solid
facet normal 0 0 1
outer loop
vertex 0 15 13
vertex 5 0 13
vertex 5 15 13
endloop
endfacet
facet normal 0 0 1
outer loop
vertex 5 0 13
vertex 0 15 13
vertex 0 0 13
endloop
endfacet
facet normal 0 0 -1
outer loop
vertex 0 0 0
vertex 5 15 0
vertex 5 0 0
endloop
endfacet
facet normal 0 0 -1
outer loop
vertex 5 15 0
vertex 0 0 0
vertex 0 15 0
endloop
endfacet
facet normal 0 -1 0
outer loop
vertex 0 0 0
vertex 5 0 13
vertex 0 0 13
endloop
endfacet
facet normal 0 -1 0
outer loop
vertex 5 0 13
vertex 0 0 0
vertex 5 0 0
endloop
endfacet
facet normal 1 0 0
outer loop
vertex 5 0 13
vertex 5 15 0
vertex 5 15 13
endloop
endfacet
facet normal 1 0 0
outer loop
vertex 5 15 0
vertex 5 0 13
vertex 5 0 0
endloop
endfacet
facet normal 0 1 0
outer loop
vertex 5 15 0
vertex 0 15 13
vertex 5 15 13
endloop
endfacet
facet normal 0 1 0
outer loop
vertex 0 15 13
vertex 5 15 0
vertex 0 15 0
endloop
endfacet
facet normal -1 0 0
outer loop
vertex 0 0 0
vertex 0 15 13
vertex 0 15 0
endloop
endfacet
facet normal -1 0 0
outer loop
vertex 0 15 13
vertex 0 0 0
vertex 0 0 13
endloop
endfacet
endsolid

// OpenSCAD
// Generated by SolidPython 1.0.1 on 2020-07-29 00:46:54


cube(size = [5, 15, 13]);
/***********************************************
*********      SolidPython code:      **********
************************************************
 
# import packages: SolidPython
from solid import *
from solid.utils import *
from itertools import chain, combinations, permutations


class Resize:

    def __init__(self, scad_file):
        self.scad_file = scad_file
        #self.scad_file = import_scad(scad_file)
        # cone/cylinder param:
        self.r1 = 0
        self.r2 = 0
        self.h = 0
        # rectangular prism param:
        self.w = 0
        self.l = 0
        # ellipse param:
        self.r = 0

    # import OpenScad code (file name corresponds to shape)


    # classify shape + parameters
    def assign(self, param1, param2, param3):
        if self.scad_file == 'cone.scad':
            self.r1 = param1
            self.r2 = param2
            self.h = param3
        elif self.scad_file == 'cylinder.scad':
            self.r1 = param1
            self.r2 = param2
            self.h = param3
        elif self.scad_file == 'rectangularPrism.scad':
            self.h = param1
            self.l = param2
            self.w = param3
        else:
            self.r = param1
            self.h = param2

    # resize parameters
    def iterate(self):
        x = range(3, 20, 2)
        i = 1
        if self.scad_file == 'cone.scad':
            tempList = list(permutations(x, 2))
            for temp in tempList:
                param1 = temp[0]
                param2 = temp[1]
                filepath = 'produced_scad_files/' + 'cone' + str(param1) + '_' + str(param2) + '_' + '.scad'
                scad_render_to_file(cylinder(h=param1, r1=param2, r2=0), filepath)

        elif self.scad_file == 'cylinder.scad':
            tempList = list(permutations(x, 3))
            for temp in tempList:
                param1 = temp[0]
                param2 = temp[1]
                filepath = 'produced_scad_files/' + 'cylinder' + str(param1) + '_' + str(param2) + '_' + '.scad'
                scad_render_to_file(cylinder(h=param1, r1=param2, r2=param2), filepath)

        elif self.scad_file == 'rectangularPrism.scad':
            tempList = list(permutations(x, 3))
            for temp in tempList:
                param1 = temp[0]
                param2 = temp[1]
                param3 = temp[2]
                filepath = 'produced_scad_files/' + 'rectangularPrism' + str(param1) + '_' + str(param2) + '_' + str(
                    param3) + '.scad'
                scad_render_to_file(cube(size=(param1, param2, param3)), filepath)

        elif self.scad_file == 'ellipse.scad':
            tempList = list(permutations(x, 4))
            for temp in tempList:
                param1 = temp[0]
                param2 = temp[1]
                param3 = temp[2]
                param4 = temp[3]
                filepath = 'produced_scad_files/' + 'ellipse' + str(param1) + '_' + str(param2) + '_' + str(param3) + '_' + str(param4) + '.scad'
                scad_render_to_file(scale([param1, param2, param3])(sphere(r=param4)), filepath)

    def render_to_scadfile(self):
        scad_render_to_file(scad, 'example.scad') 
 
************************************************/
